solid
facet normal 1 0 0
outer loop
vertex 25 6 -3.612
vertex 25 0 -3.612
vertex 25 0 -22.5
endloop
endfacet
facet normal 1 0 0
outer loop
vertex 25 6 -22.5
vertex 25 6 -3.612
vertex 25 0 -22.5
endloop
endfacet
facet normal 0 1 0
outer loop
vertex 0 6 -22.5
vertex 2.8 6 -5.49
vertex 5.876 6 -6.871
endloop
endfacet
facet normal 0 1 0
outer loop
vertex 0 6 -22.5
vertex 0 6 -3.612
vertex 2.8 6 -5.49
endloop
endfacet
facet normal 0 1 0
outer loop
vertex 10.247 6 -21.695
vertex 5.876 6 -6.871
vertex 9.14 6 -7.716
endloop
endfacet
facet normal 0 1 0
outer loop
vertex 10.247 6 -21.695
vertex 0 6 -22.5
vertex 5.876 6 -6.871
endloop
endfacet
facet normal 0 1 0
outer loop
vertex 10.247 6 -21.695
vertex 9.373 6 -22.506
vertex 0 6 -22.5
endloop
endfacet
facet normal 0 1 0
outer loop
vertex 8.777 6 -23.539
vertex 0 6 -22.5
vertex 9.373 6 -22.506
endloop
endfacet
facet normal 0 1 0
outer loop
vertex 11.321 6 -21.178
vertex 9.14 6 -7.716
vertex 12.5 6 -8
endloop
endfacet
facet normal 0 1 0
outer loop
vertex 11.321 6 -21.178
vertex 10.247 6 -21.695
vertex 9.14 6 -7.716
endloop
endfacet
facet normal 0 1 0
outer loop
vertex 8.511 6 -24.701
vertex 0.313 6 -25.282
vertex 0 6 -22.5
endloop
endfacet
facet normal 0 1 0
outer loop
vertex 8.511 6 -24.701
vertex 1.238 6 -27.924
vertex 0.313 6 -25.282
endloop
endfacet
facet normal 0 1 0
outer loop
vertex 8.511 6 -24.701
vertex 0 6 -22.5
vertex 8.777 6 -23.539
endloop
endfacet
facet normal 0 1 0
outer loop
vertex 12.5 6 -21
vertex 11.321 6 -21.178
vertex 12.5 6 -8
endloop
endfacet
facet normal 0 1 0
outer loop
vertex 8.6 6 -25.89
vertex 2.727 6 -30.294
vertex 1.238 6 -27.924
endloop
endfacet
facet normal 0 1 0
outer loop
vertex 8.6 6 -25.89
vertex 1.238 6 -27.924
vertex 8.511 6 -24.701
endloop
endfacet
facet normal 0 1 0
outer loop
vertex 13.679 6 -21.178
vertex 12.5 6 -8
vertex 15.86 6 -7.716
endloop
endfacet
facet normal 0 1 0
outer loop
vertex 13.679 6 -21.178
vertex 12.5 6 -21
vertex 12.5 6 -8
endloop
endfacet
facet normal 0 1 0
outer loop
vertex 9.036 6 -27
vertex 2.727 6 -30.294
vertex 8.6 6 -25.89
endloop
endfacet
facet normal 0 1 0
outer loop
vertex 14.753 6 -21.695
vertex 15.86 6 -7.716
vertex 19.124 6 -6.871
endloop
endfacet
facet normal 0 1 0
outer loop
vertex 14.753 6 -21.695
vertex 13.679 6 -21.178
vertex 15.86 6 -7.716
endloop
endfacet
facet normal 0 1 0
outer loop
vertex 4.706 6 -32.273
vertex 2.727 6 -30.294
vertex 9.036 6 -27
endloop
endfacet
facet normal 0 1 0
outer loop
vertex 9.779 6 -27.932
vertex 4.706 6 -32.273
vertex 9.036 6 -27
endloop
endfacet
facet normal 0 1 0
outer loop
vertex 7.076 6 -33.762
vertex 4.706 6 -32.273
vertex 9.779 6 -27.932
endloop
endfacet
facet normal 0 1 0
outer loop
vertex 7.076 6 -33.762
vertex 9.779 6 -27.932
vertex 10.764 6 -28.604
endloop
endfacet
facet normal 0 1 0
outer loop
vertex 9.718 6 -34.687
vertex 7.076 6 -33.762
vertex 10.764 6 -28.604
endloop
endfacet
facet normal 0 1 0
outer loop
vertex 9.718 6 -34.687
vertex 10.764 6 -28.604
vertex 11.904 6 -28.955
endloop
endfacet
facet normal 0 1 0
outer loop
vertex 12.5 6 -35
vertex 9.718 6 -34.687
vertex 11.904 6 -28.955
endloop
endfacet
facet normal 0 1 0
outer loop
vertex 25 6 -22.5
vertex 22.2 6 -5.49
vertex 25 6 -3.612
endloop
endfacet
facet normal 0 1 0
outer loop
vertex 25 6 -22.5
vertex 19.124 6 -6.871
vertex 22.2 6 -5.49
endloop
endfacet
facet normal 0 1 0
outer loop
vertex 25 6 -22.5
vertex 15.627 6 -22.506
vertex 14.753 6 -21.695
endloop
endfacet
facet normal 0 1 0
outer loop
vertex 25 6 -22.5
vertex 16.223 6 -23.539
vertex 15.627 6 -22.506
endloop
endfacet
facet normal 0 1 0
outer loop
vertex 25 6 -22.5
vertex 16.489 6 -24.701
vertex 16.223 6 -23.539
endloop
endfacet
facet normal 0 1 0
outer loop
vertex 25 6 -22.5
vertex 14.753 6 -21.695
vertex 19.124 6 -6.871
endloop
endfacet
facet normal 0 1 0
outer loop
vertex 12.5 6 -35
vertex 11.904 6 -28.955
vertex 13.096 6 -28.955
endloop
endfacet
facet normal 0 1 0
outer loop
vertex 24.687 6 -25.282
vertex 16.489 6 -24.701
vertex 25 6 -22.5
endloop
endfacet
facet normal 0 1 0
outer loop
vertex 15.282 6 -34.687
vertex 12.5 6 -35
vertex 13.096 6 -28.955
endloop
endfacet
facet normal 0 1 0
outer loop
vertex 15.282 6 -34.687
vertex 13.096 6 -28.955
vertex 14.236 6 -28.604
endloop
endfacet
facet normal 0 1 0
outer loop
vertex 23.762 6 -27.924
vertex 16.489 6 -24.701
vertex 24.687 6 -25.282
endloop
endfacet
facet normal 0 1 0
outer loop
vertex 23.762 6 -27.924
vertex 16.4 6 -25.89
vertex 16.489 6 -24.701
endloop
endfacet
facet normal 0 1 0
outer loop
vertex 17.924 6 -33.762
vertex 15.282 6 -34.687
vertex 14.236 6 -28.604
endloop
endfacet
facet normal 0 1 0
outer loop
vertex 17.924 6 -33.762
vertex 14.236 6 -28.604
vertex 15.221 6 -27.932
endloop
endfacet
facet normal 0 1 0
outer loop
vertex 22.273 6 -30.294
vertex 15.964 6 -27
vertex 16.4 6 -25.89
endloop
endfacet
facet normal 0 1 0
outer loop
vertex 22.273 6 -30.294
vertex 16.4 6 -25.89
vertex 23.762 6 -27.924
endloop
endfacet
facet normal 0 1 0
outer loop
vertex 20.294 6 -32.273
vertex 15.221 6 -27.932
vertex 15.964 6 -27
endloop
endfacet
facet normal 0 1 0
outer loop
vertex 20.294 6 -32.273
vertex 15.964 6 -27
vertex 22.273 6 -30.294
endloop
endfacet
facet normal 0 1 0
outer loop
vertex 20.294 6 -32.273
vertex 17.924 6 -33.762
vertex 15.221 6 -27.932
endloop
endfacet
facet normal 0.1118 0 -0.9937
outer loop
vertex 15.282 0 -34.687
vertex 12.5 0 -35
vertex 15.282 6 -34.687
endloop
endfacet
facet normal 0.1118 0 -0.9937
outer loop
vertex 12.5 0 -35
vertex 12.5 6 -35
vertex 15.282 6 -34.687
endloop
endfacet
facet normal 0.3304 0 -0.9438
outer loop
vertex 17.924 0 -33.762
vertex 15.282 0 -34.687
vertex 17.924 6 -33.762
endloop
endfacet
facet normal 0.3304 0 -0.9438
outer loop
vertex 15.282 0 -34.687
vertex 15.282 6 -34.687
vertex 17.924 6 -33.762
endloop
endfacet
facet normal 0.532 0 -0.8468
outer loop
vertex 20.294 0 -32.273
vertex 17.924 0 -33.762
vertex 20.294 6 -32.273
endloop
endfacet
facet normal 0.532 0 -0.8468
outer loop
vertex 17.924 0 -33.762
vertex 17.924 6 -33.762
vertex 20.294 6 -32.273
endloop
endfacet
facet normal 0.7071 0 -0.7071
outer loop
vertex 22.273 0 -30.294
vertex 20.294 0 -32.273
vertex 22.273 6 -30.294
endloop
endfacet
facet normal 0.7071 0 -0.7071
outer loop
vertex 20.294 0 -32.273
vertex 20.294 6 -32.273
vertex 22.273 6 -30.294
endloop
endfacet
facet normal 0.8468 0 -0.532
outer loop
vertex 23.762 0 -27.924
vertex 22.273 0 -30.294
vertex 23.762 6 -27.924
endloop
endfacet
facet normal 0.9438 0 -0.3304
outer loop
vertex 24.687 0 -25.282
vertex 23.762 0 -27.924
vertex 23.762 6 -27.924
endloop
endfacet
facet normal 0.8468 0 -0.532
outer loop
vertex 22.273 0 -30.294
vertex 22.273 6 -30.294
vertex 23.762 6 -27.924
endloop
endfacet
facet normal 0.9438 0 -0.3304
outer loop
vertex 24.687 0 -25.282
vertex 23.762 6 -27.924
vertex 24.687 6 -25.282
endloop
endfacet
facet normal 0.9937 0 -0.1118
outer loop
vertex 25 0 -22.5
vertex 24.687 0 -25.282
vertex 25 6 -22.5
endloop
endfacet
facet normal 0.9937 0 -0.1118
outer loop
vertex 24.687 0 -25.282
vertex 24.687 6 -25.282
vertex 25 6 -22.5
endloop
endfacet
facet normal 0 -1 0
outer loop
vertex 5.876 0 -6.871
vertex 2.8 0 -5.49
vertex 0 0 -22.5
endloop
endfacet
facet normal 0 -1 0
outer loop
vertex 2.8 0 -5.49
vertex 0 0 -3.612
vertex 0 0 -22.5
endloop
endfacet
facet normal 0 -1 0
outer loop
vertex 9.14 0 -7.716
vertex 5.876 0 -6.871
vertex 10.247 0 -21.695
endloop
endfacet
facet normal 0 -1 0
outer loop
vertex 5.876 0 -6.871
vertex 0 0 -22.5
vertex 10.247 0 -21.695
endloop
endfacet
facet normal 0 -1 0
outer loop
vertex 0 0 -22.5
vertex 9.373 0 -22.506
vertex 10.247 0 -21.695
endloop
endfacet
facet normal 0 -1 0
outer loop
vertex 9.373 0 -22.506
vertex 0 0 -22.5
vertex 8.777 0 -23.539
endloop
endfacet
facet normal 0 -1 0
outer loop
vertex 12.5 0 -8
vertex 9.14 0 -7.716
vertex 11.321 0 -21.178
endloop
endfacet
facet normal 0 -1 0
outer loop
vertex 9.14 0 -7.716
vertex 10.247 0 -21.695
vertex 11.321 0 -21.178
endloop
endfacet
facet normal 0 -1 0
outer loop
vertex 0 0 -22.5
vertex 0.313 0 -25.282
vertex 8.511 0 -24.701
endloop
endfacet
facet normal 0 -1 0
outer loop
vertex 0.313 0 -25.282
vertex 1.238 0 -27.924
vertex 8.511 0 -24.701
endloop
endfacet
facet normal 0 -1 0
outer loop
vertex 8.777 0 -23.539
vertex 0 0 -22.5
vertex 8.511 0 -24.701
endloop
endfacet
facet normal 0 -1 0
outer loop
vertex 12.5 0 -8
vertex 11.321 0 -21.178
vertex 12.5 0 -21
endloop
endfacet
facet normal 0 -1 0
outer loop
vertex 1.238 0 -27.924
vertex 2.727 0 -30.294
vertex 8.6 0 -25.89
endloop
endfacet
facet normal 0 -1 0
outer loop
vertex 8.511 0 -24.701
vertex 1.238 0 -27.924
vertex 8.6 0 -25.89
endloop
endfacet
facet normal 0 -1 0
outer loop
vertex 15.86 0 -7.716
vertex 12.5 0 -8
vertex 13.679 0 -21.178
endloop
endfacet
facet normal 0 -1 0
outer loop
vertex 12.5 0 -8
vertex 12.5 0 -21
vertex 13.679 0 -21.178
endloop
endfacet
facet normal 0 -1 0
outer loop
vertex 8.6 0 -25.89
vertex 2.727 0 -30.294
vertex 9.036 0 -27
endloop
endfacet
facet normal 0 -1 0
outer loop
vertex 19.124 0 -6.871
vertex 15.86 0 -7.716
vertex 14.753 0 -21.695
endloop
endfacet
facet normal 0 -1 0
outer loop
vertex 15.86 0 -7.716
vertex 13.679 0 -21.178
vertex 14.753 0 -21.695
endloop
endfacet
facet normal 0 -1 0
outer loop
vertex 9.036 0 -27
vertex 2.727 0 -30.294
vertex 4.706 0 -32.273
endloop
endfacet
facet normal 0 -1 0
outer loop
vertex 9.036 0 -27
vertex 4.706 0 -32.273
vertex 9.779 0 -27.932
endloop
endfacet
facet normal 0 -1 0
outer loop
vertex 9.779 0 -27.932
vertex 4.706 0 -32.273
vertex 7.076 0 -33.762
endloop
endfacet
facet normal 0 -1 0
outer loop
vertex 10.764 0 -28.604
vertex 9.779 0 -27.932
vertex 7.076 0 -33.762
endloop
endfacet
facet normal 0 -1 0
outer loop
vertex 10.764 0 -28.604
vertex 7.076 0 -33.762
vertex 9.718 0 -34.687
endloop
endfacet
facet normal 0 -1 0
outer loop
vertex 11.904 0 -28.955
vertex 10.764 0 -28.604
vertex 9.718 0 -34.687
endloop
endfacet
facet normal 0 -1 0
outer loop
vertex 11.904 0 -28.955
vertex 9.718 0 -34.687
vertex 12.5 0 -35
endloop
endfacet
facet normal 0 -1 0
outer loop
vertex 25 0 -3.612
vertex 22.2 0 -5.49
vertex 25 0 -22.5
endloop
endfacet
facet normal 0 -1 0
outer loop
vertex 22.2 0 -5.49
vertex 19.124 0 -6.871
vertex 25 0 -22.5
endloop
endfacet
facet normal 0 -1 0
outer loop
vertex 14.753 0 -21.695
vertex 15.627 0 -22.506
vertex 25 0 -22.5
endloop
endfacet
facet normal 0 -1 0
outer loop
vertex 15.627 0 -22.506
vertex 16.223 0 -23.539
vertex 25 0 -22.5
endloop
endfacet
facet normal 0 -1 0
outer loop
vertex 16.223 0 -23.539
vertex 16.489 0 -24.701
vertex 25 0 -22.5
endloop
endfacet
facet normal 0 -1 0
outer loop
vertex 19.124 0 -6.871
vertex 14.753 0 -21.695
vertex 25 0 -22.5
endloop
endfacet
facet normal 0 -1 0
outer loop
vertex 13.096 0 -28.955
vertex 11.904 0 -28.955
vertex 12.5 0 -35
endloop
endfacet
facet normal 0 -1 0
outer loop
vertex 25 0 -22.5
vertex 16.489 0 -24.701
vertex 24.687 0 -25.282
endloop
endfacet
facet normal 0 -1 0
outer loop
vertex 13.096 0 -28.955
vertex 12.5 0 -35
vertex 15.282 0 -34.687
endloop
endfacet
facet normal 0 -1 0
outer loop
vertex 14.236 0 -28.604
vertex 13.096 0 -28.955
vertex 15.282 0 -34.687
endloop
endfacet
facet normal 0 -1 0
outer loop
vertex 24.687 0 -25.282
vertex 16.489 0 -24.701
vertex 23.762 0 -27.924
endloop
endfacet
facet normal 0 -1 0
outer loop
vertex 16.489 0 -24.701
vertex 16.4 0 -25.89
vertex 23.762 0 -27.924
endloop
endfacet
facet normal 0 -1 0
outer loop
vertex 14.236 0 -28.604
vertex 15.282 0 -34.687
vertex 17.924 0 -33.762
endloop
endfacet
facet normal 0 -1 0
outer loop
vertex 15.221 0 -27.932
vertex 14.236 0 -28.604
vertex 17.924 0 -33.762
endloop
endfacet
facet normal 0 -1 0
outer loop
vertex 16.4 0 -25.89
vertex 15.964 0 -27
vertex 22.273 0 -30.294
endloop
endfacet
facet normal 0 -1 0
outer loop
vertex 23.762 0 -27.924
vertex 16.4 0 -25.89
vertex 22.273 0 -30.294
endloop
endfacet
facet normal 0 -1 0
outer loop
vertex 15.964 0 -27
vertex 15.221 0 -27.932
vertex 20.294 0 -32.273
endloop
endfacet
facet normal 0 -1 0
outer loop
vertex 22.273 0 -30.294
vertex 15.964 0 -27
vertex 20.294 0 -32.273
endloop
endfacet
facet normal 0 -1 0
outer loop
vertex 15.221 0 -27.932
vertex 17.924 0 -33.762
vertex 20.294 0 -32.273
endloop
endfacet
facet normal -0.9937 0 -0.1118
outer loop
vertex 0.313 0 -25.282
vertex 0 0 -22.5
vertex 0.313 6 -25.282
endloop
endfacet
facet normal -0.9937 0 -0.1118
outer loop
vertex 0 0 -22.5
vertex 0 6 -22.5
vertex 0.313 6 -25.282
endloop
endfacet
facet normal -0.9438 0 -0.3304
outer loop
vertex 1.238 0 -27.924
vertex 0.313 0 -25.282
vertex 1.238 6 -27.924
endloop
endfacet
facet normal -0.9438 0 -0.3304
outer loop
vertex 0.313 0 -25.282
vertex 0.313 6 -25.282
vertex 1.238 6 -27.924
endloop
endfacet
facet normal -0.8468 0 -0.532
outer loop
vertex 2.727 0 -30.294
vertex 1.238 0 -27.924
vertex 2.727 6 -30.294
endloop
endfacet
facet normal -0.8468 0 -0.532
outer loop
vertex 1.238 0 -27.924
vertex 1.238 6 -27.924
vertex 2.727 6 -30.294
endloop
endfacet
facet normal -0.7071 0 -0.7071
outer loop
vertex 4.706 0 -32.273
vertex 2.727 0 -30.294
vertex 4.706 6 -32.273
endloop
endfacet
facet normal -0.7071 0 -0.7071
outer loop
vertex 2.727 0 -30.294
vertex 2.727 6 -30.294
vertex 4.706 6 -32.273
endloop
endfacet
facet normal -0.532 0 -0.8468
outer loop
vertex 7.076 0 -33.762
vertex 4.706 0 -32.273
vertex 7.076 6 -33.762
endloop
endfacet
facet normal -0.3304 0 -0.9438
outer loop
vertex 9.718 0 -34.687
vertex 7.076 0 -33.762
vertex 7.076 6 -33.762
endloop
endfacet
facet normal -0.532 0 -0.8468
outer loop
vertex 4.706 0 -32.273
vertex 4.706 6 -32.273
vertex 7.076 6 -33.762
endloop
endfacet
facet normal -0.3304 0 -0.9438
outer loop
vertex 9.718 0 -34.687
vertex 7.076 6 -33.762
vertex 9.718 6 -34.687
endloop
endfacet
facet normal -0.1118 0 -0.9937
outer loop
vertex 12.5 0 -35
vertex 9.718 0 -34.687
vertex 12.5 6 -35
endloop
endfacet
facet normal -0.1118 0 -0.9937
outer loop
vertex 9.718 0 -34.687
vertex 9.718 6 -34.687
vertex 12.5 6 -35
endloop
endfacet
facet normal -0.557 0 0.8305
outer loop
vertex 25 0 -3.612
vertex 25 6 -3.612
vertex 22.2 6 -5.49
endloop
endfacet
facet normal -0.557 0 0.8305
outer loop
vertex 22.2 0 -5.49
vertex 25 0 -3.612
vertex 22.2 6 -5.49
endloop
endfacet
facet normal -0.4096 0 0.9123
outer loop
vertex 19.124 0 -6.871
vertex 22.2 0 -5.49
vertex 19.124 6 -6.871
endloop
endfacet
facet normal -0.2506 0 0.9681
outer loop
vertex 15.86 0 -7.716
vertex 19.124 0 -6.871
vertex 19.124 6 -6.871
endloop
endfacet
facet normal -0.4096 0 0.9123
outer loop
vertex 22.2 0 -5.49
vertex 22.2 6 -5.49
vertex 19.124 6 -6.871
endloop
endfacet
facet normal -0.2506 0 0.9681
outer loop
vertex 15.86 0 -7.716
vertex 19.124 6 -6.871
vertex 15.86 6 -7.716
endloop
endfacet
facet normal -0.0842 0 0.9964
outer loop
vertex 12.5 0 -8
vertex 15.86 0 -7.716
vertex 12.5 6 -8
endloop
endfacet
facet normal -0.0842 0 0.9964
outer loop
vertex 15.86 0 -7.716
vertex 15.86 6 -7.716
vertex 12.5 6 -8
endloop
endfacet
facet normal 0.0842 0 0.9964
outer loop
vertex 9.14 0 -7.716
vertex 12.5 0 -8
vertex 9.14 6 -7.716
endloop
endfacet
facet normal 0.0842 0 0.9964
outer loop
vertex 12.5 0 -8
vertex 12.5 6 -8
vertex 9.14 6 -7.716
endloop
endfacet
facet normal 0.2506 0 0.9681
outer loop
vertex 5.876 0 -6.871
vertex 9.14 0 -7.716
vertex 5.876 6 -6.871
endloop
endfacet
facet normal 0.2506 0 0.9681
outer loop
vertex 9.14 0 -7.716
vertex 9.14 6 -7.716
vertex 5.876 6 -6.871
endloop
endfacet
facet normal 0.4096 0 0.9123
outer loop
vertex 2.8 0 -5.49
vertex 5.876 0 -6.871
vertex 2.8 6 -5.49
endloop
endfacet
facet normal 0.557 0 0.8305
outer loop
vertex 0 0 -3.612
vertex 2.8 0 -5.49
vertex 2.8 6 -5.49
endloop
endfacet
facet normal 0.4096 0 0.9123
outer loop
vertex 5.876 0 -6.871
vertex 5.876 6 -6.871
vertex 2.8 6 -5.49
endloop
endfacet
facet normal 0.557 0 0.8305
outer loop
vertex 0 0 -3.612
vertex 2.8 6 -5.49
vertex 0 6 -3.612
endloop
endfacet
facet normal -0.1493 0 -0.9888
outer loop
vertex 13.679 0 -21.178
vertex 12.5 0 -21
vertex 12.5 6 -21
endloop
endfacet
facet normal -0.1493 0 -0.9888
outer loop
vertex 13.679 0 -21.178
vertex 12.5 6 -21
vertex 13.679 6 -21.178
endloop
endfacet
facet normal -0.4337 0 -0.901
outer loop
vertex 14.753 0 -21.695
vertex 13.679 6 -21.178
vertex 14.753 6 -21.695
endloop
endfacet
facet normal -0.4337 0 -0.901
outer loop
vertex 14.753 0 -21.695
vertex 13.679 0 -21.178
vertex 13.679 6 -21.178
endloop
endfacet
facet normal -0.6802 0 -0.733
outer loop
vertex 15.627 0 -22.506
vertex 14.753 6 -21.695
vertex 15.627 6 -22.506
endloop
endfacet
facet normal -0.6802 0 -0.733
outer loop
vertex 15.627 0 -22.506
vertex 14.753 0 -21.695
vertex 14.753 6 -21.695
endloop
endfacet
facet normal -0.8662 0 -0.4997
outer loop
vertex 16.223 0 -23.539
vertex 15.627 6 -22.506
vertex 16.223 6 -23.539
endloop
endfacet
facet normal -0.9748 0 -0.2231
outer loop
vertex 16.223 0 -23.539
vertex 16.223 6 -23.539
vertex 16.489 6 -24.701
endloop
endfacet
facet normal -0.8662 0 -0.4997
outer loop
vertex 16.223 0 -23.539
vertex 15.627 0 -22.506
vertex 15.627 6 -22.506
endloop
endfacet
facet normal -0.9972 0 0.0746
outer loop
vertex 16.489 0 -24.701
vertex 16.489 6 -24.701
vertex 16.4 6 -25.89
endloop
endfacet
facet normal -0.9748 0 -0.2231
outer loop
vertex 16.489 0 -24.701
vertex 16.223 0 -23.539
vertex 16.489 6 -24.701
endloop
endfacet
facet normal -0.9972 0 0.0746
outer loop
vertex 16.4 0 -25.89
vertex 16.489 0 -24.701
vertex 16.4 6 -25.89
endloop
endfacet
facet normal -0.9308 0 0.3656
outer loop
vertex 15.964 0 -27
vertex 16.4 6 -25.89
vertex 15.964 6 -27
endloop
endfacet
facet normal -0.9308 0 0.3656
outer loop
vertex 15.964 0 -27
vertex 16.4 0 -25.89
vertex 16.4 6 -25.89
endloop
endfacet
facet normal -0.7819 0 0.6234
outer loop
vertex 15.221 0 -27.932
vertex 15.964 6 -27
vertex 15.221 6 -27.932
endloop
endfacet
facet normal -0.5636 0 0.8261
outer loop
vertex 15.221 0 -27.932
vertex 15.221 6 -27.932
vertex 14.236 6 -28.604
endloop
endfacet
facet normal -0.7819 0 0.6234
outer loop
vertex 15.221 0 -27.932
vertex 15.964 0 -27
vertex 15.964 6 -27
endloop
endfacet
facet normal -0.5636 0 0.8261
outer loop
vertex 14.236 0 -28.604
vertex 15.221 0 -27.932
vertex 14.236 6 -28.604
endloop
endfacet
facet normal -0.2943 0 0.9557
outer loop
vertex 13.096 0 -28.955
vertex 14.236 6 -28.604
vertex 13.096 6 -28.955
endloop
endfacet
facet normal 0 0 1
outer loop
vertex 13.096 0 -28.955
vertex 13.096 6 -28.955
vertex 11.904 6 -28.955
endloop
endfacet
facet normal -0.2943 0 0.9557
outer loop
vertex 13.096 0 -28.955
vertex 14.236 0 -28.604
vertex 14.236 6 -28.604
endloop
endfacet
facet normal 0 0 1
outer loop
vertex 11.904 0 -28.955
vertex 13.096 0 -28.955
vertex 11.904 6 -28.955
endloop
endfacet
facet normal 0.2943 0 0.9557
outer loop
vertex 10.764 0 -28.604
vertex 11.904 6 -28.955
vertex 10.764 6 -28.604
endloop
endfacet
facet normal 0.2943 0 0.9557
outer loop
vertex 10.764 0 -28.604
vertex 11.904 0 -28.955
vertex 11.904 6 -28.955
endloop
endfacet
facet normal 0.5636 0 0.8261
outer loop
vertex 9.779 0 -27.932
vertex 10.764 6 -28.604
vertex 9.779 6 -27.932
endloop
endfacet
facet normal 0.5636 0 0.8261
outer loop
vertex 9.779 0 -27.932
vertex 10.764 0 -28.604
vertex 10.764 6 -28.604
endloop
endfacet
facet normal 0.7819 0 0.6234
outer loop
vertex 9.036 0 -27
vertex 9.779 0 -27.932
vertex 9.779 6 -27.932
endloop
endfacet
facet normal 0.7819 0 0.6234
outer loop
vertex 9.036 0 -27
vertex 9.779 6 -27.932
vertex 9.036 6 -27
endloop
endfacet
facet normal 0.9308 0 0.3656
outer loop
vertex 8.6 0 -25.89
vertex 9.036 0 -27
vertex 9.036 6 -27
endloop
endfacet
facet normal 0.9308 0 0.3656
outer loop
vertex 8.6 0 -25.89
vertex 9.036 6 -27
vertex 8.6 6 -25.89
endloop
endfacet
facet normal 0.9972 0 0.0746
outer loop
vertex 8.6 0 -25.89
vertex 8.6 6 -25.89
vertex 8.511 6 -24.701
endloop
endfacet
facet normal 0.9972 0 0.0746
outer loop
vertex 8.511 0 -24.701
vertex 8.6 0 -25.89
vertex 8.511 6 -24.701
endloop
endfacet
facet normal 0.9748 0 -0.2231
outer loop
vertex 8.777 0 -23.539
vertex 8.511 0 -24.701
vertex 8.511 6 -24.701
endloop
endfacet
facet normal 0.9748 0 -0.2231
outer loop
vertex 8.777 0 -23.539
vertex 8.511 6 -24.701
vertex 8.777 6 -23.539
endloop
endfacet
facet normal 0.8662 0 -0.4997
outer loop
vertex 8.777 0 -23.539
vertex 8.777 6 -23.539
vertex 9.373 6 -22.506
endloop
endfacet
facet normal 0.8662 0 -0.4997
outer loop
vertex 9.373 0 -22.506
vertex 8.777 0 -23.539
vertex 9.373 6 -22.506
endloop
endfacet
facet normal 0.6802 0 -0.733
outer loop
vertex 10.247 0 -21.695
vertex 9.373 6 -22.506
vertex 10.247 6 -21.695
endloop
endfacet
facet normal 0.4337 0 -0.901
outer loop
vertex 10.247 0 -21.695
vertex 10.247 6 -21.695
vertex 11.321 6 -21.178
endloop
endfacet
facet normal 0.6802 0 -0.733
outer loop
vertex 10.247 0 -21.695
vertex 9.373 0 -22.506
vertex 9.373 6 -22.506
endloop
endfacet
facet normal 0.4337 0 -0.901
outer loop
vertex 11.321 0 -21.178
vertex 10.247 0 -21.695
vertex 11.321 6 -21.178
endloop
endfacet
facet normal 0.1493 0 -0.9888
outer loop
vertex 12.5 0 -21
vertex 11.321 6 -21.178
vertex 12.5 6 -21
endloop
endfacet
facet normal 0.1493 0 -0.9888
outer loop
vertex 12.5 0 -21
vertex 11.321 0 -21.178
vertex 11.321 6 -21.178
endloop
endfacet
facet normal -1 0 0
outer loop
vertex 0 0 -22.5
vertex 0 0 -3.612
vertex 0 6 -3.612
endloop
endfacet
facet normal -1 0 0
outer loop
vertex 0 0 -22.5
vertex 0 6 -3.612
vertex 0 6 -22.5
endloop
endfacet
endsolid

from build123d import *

# Parameters (mm, degrees)
SKETCH1_W           = 25
SKETCH1_H           = 35
SKETCH1_R           = 4
BOSS_EXTRUDE1_DEPTH = 6
FILLET1_R           = 12.5
SKETCH2_R           = 20
CUT_EXTRUDE1_DEPTH  = 6


with BuildPart() as part:
    # Sketch1 → Boss-Extrude1 (new body)
    with BuildSketch(Plane(origin=(0, 0, 0), x_dir=(1, 0, 0), z_dir=(0, 1, 0))):
        with Locations((12.5, 17.5)):
            Rectangle(SKETCH1_W, SKETCH1_H)
        with Locations(Location((12.5, 25, 0), (0, 0, 270))):
            Circle(SKETCH1_R, mode=Mode.SUBTRACT)
    extrude(amount=BOSS_EXTRUDE1_DEPTH)

    # Fillet1
    fillet1_edges = [part.edges().sort_by_distance(p)[0] for p in [
        (25, 3, -35),
        (0, 3, -35),
    ]]
    fillet(fillet1_edges, radius=FILLET1_R - 0.0001)  # a hair under: the kernel refuses the full size

    # Sketch2 → Cut-Extrude1 (cut)
    with BuildSketch(Plane(origin=(0, 6, 0), x_dir=(1, 0, 0), z_dir=(0, 1, 0))):
        with Locations((12.5, -12)):
            Circle(SKETCH2_R)
    extrude(amount=-CUT_EXTRUDE1_DEPTH, mode=Mode.SUBTRACT)


solid = part.part
